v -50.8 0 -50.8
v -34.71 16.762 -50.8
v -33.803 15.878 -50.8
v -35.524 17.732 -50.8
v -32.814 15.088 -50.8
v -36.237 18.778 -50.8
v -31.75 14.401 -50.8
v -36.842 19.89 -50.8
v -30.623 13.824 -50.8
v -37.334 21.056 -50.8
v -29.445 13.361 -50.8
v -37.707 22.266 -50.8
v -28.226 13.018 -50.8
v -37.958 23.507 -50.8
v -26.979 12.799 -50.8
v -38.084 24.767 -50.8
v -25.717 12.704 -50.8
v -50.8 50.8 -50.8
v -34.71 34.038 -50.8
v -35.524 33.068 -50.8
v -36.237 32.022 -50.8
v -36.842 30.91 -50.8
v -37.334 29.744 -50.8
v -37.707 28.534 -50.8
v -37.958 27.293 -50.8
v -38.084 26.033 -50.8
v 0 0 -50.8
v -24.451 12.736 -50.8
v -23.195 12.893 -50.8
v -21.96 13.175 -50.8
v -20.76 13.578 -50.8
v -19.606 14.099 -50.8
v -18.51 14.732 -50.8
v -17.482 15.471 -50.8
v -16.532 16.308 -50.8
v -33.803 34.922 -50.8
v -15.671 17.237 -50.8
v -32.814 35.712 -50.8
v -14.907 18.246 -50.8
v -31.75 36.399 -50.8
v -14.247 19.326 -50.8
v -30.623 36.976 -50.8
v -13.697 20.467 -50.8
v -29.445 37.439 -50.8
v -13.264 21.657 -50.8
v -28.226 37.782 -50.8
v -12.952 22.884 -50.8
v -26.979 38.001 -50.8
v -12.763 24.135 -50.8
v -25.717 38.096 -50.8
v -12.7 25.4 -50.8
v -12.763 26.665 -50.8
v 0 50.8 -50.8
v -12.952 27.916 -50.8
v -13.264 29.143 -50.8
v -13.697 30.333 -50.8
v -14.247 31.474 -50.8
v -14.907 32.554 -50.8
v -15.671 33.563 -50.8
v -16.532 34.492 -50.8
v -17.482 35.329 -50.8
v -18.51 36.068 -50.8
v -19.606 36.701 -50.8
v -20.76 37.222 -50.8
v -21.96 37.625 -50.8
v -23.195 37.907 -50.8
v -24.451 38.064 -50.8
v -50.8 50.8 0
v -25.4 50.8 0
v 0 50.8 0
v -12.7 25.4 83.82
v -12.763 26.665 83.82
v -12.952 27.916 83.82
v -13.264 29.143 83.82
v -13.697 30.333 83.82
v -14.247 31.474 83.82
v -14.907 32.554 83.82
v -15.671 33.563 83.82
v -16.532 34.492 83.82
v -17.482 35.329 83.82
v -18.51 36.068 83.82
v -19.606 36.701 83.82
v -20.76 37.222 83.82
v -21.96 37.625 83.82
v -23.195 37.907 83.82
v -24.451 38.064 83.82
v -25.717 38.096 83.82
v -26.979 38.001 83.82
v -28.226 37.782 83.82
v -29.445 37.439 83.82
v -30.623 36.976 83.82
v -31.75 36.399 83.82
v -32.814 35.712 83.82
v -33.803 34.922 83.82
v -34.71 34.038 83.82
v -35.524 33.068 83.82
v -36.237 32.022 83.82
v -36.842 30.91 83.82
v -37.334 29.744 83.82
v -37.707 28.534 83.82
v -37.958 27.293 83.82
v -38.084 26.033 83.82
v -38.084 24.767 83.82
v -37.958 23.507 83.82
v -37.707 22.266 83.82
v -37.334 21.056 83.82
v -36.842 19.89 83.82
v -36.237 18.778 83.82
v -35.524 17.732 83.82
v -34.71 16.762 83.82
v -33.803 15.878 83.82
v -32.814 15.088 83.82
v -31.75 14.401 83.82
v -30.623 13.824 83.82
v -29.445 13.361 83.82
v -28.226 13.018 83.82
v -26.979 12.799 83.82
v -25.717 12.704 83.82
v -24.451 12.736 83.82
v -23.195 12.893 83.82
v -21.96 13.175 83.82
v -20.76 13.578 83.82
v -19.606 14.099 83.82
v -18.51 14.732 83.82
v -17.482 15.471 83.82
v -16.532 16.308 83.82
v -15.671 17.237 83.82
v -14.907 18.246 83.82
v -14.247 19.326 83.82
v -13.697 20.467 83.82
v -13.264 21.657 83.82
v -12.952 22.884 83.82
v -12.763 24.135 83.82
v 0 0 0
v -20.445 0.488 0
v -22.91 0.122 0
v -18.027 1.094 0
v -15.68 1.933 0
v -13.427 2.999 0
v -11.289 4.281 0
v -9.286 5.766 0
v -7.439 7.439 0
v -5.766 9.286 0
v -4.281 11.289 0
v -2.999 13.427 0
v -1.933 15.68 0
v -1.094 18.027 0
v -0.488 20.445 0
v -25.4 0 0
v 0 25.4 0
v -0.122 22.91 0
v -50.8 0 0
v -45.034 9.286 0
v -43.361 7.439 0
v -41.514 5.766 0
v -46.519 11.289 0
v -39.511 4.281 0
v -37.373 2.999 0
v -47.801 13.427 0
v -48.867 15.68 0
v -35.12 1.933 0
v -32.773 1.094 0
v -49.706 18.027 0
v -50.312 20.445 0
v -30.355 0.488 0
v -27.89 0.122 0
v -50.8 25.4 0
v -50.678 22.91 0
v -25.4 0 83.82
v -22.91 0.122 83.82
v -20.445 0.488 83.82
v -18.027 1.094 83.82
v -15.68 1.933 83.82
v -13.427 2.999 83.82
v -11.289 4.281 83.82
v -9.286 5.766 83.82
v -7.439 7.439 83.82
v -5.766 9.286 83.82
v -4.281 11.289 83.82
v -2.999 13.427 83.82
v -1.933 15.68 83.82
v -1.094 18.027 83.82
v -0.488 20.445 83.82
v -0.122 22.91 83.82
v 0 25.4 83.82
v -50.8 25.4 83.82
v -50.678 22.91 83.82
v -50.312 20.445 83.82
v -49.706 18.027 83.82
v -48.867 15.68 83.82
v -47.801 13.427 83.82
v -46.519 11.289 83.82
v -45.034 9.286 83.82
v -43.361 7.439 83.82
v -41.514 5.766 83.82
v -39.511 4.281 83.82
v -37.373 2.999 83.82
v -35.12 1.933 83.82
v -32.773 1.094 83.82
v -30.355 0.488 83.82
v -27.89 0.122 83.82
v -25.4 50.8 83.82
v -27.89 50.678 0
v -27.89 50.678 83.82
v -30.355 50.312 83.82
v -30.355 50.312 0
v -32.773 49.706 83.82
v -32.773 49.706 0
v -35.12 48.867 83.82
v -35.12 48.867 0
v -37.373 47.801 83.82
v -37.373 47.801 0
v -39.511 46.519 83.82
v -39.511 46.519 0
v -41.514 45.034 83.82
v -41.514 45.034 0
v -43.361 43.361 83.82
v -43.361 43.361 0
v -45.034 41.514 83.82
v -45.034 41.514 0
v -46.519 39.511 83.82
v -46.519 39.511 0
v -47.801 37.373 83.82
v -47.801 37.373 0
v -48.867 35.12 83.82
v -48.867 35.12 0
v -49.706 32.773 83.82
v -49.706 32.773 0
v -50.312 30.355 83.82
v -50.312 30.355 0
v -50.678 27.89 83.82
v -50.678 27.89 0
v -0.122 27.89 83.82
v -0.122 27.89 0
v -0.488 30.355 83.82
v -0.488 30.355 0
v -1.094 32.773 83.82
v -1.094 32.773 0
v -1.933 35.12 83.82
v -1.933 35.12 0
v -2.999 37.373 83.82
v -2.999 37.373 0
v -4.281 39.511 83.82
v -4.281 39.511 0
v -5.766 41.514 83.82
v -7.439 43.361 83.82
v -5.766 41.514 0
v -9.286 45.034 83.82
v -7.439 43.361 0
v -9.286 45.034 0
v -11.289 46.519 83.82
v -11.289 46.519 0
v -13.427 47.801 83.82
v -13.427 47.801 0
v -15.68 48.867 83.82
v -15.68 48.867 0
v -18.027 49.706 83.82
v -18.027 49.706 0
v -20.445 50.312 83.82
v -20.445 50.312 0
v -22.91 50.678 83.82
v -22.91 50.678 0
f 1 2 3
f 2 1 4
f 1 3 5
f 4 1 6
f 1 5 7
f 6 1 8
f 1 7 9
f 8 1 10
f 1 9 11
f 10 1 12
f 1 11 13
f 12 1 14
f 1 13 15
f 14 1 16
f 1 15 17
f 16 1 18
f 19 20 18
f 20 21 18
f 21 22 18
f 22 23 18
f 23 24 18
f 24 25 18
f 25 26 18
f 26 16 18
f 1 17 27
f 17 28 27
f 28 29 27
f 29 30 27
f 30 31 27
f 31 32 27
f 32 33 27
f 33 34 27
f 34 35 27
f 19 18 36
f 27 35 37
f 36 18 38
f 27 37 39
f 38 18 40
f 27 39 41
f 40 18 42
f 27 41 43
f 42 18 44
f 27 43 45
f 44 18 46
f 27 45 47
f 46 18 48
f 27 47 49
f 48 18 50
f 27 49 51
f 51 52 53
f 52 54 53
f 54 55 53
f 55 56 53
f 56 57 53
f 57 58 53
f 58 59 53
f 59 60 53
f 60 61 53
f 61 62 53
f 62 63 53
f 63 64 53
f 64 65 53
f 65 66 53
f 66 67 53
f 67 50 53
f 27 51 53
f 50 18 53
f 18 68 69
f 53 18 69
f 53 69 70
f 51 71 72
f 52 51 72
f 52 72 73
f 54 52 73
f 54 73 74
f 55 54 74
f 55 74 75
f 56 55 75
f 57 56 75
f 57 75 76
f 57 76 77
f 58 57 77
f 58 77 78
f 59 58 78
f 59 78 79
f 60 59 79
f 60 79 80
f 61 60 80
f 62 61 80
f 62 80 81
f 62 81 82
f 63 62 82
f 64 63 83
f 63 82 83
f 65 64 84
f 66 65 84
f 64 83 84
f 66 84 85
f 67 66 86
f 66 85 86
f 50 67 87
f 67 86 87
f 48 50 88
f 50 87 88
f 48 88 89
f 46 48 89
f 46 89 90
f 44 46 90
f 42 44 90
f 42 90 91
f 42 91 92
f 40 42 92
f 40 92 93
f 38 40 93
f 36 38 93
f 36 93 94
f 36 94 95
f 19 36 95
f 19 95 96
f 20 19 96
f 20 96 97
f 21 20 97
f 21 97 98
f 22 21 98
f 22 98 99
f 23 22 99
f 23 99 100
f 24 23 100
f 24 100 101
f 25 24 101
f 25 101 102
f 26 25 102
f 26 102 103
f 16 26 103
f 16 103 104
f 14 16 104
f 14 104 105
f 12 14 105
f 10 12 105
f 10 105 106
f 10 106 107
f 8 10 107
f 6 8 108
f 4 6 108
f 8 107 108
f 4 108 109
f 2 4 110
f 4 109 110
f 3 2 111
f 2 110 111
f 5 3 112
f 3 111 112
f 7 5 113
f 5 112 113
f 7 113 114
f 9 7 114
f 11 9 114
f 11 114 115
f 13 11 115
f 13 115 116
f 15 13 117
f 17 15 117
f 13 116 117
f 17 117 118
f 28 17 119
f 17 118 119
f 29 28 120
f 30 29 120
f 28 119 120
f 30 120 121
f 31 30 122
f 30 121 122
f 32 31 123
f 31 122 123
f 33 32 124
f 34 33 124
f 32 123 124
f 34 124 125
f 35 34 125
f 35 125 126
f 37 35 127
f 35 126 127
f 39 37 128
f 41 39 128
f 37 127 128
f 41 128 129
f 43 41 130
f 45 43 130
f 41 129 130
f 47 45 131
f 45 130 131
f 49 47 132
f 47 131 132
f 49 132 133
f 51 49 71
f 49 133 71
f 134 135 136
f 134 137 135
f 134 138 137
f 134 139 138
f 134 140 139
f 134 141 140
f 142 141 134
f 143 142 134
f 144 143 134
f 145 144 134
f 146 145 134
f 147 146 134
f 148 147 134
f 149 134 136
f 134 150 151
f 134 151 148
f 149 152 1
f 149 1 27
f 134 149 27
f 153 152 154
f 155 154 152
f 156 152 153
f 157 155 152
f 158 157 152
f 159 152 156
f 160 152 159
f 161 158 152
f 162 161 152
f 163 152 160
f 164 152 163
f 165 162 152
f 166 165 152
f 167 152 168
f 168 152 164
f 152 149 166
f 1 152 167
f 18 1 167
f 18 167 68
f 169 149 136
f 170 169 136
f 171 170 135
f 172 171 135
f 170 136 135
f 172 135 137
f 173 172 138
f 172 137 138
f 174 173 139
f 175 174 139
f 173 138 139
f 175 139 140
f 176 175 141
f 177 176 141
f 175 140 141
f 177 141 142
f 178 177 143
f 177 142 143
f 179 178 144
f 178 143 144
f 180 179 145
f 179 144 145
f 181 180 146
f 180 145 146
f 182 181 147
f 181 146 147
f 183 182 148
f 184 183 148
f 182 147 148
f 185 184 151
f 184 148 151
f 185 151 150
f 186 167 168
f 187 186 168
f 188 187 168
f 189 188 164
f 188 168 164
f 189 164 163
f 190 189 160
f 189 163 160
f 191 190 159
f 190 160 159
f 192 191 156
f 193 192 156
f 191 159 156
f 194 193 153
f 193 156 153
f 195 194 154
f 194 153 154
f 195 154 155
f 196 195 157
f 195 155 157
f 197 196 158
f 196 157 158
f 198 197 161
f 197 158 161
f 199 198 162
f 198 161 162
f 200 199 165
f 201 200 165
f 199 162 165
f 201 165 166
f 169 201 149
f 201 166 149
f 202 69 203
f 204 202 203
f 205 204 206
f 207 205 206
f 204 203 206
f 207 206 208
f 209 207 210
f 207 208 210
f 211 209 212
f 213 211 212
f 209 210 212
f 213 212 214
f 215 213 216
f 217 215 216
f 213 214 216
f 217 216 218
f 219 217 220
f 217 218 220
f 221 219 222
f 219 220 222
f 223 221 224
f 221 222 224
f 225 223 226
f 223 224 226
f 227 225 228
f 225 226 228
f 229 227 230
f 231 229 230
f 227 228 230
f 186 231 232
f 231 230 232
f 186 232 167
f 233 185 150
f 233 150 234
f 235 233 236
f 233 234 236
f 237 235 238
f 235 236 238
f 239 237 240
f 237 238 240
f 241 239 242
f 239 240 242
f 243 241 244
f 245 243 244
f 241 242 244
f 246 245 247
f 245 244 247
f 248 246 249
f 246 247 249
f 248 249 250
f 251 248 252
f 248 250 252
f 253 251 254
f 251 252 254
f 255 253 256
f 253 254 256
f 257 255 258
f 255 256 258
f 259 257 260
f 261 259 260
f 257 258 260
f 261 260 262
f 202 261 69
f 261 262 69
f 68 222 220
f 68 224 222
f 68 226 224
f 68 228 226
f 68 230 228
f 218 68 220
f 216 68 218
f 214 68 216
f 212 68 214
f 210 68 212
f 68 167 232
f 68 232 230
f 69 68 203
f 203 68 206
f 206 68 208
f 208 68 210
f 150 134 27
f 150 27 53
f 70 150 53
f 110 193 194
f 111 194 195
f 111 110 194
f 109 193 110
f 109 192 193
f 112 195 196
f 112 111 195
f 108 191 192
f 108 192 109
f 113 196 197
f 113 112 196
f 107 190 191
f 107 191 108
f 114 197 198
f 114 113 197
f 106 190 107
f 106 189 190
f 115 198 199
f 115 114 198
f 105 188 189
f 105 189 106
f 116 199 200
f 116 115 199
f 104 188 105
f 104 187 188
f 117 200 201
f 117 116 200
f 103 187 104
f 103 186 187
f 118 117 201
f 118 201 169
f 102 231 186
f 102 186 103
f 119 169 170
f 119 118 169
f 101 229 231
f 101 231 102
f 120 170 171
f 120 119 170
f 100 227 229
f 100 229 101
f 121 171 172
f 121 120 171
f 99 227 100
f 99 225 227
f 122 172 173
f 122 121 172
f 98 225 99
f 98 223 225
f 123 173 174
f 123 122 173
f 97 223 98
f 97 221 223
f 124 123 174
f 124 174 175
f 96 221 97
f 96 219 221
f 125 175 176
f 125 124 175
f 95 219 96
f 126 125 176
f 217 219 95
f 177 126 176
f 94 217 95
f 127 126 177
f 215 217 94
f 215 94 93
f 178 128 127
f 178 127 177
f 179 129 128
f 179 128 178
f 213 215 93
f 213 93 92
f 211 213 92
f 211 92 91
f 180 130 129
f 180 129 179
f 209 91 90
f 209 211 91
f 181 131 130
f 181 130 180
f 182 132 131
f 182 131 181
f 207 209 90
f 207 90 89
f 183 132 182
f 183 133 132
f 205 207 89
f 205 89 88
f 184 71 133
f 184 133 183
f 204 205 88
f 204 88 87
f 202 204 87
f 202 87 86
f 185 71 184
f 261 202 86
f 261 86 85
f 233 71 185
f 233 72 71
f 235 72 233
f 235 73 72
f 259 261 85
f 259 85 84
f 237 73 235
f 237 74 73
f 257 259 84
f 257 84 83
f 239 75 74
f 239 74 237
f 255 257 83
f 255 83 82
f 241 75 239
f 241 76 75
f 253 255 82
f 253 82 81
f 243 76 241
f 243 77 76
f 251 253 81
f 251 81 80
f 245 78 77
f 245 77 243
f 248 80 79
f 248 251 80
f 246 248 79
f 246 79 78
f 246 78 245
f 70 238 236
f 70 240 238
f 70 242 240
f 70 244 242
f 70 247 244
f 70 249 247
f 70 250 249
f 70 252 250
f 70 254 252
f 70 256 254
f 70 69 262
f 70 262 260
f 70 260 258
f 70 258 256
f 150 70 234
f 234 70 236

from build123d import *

# Parameters (mm, degrees)
F0_W     = 50.8
F0_H     = 50.8
F1_DEPTH = 50.8
F3_DEPTH = 83.82
F4_R     = 12.7
F5_DEPTH = 143.764


with BuildPart() as f1:
    # F0 (on Top) → F1 (new body)
    with BuildSketch(Plane.XY):
        with Locations((-25.4, 25.4)):
            Rectangle(F0_W, F0_H)
    extrude(amount=-F1_DEPTH)

    # F2 (on face) → F3 (join)
    with BuildSketch(Plane.XY):
        with BuildLine():
            ThreePointArc((-25.4, 0), (-7.439488, 7.439488), (0, 25.4))
            ThreePointArc((0, 25.4), (-7.439488, 43.360512), (-25.4, 50.8))
            ThreePointArc((-25.4, 50.8), (-43.360512, 43.360512), (-50.8, 25.4))
            ThreePointArc((-50.8, 25.4), (-43.360512, 7.439488), (-25.4, 0))
        make_face()
    extrude(amount=F3_DEPTH)

    # F4 (on face) → F5 (cut)
    with BuildSketch(Plane.XY.offset(83.82)):
        with Locations((-25.4, 25.4)):
            Circle(F4_R)
    extrude(amount=-F5_DEPTH, mode=Mode.SUBTRACT)


solid = f1.part
